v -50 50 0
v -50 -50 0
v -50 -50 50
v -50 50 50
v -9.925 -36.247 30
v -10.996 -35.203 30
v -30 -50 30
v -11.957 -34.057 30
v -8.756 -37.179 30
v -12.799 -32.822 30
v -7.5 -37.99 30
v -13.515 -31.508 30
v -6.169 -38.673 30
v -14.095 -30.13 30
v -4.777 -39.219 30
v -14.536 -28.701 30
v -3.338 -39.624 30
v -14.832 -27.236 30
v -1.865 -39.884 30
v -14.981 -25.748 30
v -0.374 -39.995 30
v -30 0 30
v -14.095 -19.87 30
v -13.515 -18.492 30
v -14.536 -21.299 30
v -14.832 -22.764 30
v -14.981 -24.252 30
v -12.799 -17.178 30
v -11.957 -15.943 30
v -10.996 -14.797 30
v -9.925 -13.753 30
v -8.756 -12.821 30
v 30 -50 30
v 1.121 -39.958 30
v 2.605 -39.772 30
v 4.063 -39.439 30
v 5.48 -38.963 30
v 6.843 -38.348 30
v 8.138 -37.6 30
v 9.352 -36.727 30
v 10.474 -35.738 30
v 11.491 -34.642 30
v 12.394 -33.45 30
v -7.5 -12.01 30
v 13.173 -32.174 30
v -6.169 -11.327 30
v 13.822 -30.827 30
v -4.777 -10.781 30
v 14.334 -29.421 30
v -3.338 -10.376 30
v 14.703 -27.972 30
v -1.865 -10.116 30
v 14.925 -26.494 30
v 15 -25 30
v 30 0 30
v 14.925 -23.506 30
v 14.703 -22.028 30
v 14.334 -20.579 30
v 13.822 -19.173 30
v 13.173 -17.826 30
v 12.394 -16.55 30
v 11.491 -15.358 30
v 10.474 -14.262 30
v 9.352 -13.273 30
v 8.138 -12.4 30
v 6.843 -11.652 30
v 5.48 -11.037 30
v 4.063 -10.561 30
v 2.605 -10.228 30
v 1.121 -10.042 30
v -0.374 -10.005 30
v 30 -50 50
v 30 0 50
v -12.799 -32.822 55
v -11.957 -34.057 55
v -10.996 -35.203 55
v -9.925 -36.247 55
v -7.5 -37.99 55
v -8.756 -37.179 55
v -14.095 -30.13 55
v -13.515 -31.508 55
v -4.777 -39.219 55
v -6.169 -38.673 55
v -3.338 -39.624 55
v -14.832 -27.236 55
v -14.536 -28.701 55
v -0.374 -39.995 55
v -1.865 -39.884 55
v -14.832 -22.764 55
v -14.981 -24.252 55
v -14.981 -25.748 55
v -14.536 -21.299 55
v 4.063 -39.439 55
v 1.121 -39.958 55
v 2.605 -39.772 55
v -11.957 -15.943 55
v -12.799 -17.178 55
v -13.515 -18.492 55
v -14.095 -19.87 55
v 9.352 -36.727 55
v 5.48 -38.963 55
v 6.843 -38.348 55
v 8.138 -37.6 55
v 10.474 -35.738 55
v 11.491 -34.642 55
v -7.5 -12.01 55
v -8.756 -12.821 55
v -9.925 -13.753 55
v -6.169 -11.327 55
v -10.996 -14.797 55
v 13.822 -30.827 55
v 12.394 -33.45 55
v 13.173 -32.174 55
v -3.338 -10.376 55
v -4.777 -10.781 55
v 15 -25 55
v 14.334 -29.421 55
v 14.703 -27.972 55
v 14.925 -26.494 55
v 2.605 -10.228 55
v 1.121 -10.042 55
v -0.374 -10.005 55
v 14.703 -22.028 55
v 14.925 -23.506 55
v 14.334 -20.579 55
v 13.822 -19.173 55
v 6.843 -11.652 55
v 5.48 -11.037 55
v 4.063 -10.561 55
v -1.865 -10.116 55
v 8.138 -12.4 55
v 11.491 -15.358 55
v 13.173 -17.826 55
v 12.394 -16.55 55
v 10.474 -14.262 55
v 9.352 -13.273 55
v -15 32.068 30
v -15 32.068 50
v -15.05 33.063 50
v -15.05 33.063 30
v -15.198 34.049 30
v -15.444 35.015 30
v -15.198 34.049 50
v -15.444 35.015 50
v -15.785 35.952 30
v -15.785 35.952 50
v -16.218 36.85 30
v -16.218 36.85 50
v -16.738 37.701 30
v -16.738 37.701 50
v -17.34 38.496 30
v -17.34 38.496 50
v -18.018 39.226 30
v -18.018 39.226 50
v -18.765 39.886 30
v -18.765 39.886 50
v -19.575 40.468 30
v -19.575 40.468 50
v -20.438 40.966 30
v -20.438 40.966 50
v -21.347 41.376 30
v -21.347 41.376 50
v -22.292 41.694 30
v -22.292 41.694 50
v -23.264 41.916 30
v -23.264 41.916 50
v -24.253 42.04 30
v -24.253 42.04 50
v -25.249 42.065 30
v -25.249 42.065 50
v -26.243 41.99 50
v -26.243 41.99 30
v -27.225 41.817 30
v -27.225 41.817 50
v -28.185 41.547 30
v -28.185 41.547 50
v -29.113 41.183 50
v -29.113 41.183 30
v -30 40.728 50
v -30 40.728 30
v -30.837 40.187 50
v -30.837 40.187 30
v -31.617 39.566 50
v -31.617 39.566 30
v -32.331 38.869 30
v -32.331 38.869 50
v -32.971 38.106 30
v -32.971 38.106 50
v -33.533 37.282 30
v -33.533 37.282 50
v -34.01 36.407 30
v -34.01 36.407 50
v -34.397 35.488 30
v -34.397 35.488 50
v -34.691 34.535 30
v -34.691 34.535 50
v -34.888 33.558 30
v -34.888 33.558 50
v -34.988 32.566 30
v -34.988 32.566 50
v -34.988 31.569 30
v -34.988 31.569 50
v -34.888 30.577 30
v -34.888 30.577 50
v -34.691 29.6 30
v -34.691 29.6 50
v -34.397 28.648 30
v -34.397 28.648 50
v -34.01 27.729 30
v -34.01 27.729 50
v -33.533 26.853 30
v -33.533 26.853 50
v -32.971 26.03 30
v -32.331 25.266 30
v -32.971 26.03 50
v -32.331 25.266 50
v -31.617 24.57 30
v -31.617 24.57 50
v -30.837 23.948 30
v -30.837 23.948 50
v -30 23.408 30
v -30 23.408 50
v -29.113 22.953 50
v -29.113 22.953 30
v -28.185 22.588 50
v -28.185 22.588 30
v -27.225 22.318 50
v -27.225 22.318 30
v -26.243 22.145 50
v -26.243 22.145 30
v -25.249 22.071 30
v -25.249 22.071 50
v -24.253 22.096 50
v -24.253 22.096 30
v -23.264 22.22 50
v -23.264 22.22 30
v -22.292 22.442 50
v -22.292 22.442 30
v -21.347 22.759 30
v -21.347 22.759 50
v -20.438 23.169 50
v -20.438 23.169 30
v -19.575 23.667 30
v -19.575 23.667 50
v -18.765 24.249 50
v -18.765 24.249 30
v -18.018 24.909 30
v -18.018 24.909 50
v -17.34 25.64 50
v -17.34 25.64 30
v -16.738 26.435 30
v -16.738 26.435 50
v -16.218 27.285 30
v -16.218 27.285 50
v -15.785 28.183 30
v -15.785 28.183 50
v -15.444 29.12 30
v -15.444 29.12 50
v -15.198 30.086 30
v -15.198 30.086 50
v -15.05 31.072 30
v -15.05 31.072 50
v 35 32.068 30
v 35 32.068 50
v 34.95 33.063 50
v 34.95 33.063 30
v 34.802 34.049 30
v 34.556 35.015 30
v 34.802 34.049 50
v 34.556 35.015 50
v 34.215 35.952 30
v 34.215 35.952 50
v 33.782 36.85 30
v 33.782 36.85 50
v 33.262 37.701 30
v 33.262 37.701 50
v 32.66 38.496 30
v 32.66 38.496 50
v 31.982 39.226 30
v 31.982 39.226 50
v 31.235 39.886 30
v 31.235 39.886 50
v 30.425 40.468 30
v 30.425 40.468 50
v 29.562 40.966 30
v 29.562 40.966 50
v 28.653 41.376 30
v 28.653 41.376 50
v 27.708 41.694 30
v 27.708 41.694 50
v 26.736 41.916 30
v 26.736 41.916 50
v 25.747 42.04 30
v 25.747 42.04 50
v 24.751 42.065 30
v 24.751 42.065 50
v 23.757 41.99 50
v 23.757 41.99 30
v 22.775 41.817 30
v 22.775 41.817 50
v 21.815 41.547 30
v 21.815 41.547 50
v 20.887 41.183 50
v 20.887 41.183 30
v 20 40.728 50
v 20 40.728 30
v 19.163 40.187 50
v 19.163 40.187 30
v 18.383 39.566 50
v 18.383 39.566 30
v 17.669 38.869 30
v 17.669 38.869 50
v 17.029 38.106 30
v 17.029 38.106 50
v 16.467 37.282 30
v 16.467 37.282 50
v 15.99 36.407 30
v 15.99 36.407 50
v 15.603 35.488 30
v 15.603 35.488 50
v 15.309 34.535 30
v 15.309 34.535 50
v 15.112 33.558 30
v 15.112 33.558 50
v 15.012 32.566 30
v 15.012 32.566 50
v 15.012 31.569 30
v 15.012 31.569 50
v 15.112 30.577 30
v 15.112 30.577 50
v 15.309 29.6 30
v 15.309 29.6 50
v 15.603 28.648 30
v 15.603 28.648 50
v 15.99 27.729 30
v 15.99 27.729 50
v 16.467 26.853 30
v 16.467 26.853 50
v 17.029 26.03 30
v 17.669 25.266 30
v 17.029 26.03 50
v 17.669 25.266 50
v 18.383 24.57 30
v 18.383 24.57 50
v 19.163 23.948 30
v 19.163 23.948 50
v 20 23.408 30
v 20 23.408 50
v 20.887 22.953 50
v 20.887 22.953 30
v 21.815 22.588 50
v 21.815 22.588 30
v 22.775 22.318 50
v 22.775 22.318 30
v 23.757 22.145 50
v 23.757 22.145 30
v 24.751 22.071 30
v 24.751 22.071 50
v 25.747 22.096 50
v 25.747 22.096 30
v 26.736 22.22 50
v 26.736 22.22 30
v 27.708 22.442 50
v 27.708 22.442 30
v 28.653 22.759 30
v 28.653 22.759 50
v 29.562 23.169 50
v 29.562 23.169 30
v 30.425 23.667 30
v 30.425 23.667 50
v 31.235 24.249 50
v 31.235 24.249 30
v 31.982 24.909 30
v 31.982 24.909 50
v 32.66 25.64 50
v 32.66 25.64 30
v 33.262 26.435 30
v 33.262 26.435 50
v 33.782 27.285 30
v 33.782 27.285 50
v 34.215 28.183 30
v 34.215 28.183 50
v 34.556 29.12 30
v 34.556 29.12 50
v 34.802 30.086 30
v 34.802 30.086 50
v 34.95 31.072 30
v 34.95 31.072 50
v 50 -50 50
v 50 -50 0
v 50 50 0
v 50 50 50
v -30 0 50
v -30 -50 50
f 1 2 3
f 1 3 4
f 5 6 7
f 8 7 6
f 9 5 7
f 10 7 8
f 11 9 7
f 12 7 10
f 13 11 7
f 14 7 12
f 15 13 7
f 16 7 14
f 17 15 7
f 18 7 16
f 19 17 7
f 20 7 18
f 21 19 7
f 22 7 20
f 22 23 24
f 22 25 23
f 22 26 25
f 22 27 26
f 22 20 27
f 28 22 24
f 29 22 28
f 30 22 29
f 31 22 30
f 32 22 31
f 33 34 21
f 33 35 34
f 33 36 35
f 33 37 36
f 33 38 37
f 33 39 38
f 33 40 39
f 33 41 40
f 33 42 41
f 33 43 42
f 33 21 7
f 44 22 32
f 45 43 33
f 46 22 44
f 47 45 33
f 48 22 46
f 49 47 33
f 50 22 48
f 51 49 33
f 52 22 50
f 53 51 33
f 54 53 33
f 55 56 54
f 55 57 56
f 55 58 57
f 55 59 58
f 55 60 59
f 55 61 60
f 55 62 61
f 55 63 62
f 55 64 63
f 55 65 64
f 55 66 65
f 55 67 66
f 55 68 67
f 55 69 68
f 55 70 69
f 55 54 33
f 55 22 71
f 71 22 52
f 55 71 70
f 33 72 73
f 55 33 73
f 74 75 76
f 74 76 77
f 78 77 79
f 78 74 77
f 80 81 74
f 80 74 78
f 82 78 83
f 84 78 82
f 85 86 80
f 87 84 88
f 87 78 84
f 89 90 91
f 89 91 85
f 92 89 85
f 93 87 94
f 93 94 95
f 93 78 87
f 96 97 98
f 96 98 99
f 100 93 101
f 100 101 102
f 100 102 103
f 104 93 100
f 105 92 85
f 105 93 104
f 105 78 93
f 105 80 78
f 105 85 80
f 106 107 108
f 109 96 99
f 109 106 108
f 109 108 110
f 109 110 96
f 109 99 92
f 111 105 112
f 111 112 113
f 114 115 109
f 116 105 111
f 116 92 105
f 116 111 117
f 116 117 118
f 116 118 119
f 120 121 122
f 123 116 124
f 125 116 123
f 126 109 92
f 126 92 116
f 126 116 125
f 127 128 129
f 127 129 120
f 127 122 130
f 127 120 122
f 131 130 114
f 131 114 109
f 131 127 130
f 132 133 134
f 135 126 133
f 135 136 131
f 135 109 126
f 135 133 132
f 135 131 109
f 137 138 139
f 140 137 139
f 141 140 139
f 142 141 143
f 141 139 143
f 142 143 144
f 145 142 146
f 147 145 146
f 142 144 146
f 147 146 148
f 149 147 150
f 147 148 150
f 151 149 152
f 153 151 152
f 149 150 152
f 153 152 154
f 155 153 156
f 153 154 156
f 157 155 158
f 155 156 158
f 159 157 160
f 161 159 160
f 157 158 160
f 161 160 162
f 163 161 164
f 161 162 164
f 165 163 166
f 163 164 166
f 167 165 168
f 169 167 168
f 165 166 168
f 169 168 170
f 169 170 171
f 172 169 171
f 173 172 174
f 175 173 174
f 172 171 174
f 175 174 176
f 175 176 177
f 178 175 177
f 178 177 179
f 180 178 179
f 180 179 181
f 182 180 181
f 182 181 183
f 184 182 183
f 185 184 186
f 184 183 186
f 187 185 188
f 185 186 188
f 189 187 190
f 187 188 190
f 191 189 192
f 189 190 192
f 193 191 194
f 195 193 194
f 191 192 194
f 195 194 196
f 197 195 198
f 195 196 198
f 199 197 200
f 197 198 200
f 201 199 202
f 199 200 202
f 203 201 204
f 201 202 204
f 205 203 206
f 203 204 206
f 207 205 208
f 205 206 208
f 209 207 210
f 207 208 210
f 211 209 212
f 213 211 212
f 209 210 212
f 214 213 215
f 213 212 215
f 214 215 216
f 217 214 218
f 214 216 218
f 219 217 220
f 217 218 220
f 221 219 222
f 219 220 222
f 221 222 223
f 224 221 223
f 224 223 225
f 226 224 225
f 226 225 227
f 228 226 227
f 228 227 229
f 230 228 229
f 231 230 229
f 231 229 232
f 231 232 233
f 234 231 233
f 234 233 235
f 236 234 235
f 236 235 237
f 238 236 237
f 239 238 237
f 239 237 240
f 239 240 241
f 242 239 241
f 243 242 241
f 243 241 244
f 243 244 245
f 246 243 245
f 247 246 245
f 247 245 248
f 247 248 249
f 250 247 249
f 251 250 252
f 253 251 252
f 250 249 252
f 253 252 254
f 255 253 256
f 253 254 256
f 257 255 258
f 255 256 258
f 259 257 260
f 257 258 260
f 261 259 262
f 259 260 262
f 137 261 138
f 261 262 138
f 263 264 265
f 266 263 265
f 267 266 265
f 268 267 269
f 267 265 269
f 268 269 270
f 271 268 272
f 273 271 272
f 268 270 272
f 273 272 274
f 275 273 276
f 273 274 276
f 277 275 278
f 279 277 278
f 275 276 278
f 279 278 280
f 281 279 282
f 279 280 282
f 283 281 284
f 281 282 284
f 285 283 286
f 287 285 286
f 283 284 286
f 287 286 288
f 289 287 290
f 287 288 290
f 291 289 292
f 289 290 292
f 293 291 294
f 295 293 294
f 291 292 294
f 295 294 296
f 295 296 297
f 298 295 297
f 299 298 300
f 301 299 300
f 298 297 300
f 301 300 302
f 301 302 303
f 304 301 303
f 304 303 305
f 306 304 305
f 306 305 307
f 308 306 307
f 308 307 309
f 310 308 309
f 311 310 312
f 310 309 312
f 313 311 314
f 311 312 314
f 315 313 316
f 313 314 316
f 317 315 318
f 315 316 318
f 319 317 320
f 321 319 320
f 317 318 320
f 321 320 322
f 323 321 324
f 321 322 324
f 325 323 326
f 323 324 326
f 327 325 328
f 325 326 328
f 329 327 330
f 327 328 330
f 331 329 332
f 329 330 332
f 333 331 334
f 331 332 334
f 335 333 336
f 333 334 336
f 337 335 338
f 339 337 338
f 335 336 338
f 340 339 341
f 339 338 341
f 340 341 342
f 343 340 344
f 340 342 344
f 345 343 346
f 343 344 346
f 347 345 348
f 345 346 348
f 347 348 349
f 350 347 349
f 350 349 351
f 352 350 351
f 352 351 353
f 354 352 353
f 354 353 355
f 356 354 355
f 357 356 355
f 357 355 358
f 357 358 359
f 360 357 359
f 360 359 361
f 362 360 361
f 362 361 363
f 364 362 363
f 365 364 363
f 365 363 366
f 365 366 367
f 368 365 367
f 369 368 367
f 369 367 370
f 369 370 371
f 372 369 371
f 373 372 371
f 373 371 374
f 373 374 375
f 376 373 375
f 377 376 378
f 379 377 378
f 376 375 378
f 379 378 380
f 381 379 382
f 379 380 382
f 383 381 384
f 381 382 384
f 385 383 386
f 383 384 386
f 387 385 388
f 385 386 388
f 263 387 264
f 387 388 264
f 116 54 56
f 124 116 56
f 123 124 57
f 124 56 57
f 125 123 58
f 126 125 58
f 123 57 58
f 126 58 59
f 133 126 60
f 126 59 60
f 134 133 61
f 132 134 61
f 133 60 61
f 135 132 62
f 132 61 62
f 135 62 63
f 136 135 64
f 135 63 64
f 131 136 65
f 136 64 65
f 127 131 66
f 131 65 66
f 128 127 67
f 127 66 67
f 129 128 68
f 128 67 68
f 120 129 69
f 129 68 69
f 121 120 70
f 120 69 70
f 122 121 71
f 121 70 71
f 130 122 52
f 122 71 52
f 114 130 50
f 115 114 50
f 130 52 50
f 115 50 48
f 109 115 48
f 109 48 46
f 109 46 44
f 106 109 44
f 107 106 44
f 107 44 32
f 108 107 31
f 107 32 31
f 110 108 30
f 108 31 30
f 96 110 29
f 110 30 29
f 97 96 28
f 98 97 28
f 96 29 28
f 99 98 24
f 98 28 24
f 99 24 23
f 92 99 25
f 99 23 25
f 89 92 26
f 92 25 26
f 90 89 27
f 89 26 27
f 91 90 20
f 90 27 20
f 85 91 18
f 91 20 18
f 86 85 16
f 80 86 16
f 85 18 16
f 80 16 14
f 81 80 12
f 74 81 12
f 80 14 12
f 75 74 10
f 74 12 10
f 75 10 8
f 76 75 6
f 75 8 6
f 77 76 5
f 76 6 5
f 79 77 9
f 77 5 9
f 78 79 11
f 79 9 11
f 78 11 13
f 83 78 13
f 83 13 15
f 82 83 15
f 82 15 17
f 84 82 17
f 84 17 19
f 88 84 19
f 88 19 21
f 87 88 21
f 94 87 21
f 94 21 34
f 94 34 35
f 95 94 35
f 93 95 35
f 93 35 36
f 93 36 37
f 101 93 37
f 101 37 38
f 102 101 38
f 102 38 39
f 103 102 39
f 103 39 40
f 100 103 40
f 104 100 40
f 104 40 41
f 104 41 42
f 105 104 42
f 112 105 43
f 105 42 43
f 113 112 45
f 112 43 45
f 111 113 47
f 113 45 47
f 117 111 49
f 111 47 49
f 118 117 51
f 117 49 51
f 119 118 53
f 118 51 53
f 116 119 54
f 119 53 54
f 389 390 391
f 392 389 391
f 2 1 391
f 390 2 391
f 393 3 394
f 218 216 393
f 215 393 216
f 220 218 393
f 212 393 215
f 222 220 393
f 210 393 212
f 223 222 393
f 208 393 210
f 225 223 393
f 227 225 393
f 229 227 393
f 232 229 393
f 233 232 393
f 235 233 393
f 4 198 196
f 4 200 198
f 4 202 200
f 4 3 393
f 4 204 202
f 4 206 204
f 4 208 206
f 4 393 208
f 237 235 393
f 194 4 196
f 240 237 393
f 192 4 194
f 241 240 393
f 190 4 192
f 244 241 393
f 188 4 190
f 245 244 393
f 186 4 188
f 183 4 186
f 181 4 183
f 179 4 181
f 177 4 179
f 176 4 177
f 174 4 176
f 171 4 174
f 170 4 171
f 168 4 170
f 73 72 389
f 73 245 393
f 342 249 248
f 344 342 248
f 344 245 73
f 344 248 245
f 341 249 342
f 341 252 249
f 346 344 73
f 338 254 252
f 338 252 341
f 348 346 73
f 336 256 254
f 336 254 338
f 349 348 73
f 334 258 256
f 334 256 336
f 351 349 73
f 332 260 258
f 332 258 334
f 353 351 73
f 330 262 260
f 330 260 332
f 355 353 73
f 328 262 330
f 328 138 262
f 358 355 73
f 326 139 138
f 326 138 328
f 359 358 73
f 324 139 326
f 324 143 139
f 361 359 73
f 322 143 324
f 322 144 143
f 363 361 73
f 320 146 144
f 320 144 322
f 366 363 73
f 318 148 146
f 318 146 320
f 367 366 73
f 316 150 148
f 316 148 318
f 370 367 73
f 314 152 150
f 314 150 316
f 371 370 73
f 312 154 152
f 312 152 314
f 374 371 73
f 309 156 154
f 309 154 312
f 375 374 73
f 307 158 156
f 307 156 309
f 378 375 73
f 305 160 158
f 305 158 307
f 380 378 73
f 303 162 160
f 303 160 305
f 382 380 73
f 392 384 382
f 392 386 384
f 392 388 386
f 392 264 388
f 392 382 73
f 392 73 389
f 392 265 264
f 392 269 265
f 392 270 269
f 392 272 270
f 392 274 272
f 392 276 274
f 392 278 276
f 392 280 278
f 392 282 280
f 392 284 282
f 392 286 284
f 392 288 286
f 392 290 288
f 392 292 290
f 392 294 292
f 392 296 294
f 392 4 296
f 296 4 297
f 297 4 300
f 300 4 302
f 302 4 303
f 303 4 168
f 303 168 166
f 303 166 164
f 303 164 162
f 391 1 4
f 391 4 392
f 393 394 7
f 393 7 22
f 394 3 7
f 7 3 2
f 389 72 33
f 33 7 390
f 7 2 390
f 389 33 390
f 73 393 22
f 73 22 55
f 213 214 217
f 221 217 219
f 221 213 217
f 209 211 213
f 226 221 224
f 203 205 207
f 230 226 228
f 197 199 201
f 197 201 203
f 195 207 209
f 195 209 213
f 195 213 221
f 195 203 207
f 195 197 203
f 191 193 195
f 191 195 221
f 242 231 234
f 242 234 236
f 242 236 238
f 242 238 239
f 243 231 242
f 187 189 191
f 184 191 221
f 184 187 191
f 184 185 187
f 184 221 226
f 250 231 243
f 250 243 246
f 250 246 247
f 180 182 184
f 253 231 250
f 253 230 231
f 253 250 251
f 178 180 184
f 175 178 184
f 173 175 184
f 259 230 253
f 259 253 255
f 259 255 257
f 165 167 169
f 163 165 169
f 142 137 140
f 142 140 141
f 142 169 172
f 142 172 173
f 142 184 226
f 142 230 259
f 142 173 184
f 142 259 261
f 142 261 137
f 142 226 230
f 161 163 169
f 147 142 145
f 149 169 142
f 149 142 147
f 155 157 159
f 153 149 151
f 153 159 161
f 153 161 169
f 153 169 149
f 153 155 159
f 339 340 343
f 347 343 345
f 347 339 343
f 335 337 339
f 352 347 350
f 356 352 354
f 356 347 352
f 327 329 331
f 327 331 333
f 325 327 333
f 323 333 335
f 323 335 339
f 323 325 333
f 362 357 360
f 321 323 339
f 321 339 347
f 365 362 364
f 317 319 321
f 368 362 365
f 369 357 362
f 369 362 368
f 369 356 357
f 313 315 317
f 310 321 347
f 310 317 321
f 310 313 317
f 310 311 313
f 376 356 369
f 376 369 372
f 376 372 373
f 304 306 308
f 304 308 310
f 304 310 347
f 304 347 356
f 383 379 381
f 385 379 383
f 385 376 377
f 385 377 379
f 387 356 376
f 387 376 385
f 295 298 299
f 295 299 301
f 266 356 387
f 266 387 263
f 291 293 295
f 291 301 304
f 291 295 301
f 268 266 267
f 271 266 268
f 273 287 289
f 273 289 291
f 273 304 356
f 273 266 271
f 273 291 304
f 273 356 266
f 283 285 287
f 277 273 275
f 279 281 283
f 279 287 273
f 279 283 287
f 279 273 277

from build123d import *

# Parameters (mm, degrees)
F0_W     = 100
F0_H     = 100
F1_DEPTH = 50
F2_W     = 60
F2_H     = 50
F2_R     = 10
F3_DEPTH = 20
F4_R     = 15
F5_DEPTH = 25


with BuildPart() as f1:
    # F0 (on Top) → F1 (new body)
    with BuildSketch(Plane.XY):
        Rectangle(F0_W, F0_H)
    extrude(amount=F1_DEPTH)

    # F2 (on face) → F3 (cut)
    with BuildSketch(Plane.XY.offset(50)):
        with Locations((0, -25)):
            Rectangle(F2_W, F2_H)
        with Locations((-25, 32.067757)):
            Circle(F2_R)
        with Locations((25, 32.067757)):
            Circle(F2_R)
    extrude(amount=-F3_DEPTH, mode=Mode.SUBTRACT)

    # F4 (on face) → F5 (join)
    with BuildSketch(Plane.XY.offset(30)):
        with Locations((0, -25)):
            Circle(F4_R)
    extrude(amount=F5_DEPTH)


solid = f1.part
